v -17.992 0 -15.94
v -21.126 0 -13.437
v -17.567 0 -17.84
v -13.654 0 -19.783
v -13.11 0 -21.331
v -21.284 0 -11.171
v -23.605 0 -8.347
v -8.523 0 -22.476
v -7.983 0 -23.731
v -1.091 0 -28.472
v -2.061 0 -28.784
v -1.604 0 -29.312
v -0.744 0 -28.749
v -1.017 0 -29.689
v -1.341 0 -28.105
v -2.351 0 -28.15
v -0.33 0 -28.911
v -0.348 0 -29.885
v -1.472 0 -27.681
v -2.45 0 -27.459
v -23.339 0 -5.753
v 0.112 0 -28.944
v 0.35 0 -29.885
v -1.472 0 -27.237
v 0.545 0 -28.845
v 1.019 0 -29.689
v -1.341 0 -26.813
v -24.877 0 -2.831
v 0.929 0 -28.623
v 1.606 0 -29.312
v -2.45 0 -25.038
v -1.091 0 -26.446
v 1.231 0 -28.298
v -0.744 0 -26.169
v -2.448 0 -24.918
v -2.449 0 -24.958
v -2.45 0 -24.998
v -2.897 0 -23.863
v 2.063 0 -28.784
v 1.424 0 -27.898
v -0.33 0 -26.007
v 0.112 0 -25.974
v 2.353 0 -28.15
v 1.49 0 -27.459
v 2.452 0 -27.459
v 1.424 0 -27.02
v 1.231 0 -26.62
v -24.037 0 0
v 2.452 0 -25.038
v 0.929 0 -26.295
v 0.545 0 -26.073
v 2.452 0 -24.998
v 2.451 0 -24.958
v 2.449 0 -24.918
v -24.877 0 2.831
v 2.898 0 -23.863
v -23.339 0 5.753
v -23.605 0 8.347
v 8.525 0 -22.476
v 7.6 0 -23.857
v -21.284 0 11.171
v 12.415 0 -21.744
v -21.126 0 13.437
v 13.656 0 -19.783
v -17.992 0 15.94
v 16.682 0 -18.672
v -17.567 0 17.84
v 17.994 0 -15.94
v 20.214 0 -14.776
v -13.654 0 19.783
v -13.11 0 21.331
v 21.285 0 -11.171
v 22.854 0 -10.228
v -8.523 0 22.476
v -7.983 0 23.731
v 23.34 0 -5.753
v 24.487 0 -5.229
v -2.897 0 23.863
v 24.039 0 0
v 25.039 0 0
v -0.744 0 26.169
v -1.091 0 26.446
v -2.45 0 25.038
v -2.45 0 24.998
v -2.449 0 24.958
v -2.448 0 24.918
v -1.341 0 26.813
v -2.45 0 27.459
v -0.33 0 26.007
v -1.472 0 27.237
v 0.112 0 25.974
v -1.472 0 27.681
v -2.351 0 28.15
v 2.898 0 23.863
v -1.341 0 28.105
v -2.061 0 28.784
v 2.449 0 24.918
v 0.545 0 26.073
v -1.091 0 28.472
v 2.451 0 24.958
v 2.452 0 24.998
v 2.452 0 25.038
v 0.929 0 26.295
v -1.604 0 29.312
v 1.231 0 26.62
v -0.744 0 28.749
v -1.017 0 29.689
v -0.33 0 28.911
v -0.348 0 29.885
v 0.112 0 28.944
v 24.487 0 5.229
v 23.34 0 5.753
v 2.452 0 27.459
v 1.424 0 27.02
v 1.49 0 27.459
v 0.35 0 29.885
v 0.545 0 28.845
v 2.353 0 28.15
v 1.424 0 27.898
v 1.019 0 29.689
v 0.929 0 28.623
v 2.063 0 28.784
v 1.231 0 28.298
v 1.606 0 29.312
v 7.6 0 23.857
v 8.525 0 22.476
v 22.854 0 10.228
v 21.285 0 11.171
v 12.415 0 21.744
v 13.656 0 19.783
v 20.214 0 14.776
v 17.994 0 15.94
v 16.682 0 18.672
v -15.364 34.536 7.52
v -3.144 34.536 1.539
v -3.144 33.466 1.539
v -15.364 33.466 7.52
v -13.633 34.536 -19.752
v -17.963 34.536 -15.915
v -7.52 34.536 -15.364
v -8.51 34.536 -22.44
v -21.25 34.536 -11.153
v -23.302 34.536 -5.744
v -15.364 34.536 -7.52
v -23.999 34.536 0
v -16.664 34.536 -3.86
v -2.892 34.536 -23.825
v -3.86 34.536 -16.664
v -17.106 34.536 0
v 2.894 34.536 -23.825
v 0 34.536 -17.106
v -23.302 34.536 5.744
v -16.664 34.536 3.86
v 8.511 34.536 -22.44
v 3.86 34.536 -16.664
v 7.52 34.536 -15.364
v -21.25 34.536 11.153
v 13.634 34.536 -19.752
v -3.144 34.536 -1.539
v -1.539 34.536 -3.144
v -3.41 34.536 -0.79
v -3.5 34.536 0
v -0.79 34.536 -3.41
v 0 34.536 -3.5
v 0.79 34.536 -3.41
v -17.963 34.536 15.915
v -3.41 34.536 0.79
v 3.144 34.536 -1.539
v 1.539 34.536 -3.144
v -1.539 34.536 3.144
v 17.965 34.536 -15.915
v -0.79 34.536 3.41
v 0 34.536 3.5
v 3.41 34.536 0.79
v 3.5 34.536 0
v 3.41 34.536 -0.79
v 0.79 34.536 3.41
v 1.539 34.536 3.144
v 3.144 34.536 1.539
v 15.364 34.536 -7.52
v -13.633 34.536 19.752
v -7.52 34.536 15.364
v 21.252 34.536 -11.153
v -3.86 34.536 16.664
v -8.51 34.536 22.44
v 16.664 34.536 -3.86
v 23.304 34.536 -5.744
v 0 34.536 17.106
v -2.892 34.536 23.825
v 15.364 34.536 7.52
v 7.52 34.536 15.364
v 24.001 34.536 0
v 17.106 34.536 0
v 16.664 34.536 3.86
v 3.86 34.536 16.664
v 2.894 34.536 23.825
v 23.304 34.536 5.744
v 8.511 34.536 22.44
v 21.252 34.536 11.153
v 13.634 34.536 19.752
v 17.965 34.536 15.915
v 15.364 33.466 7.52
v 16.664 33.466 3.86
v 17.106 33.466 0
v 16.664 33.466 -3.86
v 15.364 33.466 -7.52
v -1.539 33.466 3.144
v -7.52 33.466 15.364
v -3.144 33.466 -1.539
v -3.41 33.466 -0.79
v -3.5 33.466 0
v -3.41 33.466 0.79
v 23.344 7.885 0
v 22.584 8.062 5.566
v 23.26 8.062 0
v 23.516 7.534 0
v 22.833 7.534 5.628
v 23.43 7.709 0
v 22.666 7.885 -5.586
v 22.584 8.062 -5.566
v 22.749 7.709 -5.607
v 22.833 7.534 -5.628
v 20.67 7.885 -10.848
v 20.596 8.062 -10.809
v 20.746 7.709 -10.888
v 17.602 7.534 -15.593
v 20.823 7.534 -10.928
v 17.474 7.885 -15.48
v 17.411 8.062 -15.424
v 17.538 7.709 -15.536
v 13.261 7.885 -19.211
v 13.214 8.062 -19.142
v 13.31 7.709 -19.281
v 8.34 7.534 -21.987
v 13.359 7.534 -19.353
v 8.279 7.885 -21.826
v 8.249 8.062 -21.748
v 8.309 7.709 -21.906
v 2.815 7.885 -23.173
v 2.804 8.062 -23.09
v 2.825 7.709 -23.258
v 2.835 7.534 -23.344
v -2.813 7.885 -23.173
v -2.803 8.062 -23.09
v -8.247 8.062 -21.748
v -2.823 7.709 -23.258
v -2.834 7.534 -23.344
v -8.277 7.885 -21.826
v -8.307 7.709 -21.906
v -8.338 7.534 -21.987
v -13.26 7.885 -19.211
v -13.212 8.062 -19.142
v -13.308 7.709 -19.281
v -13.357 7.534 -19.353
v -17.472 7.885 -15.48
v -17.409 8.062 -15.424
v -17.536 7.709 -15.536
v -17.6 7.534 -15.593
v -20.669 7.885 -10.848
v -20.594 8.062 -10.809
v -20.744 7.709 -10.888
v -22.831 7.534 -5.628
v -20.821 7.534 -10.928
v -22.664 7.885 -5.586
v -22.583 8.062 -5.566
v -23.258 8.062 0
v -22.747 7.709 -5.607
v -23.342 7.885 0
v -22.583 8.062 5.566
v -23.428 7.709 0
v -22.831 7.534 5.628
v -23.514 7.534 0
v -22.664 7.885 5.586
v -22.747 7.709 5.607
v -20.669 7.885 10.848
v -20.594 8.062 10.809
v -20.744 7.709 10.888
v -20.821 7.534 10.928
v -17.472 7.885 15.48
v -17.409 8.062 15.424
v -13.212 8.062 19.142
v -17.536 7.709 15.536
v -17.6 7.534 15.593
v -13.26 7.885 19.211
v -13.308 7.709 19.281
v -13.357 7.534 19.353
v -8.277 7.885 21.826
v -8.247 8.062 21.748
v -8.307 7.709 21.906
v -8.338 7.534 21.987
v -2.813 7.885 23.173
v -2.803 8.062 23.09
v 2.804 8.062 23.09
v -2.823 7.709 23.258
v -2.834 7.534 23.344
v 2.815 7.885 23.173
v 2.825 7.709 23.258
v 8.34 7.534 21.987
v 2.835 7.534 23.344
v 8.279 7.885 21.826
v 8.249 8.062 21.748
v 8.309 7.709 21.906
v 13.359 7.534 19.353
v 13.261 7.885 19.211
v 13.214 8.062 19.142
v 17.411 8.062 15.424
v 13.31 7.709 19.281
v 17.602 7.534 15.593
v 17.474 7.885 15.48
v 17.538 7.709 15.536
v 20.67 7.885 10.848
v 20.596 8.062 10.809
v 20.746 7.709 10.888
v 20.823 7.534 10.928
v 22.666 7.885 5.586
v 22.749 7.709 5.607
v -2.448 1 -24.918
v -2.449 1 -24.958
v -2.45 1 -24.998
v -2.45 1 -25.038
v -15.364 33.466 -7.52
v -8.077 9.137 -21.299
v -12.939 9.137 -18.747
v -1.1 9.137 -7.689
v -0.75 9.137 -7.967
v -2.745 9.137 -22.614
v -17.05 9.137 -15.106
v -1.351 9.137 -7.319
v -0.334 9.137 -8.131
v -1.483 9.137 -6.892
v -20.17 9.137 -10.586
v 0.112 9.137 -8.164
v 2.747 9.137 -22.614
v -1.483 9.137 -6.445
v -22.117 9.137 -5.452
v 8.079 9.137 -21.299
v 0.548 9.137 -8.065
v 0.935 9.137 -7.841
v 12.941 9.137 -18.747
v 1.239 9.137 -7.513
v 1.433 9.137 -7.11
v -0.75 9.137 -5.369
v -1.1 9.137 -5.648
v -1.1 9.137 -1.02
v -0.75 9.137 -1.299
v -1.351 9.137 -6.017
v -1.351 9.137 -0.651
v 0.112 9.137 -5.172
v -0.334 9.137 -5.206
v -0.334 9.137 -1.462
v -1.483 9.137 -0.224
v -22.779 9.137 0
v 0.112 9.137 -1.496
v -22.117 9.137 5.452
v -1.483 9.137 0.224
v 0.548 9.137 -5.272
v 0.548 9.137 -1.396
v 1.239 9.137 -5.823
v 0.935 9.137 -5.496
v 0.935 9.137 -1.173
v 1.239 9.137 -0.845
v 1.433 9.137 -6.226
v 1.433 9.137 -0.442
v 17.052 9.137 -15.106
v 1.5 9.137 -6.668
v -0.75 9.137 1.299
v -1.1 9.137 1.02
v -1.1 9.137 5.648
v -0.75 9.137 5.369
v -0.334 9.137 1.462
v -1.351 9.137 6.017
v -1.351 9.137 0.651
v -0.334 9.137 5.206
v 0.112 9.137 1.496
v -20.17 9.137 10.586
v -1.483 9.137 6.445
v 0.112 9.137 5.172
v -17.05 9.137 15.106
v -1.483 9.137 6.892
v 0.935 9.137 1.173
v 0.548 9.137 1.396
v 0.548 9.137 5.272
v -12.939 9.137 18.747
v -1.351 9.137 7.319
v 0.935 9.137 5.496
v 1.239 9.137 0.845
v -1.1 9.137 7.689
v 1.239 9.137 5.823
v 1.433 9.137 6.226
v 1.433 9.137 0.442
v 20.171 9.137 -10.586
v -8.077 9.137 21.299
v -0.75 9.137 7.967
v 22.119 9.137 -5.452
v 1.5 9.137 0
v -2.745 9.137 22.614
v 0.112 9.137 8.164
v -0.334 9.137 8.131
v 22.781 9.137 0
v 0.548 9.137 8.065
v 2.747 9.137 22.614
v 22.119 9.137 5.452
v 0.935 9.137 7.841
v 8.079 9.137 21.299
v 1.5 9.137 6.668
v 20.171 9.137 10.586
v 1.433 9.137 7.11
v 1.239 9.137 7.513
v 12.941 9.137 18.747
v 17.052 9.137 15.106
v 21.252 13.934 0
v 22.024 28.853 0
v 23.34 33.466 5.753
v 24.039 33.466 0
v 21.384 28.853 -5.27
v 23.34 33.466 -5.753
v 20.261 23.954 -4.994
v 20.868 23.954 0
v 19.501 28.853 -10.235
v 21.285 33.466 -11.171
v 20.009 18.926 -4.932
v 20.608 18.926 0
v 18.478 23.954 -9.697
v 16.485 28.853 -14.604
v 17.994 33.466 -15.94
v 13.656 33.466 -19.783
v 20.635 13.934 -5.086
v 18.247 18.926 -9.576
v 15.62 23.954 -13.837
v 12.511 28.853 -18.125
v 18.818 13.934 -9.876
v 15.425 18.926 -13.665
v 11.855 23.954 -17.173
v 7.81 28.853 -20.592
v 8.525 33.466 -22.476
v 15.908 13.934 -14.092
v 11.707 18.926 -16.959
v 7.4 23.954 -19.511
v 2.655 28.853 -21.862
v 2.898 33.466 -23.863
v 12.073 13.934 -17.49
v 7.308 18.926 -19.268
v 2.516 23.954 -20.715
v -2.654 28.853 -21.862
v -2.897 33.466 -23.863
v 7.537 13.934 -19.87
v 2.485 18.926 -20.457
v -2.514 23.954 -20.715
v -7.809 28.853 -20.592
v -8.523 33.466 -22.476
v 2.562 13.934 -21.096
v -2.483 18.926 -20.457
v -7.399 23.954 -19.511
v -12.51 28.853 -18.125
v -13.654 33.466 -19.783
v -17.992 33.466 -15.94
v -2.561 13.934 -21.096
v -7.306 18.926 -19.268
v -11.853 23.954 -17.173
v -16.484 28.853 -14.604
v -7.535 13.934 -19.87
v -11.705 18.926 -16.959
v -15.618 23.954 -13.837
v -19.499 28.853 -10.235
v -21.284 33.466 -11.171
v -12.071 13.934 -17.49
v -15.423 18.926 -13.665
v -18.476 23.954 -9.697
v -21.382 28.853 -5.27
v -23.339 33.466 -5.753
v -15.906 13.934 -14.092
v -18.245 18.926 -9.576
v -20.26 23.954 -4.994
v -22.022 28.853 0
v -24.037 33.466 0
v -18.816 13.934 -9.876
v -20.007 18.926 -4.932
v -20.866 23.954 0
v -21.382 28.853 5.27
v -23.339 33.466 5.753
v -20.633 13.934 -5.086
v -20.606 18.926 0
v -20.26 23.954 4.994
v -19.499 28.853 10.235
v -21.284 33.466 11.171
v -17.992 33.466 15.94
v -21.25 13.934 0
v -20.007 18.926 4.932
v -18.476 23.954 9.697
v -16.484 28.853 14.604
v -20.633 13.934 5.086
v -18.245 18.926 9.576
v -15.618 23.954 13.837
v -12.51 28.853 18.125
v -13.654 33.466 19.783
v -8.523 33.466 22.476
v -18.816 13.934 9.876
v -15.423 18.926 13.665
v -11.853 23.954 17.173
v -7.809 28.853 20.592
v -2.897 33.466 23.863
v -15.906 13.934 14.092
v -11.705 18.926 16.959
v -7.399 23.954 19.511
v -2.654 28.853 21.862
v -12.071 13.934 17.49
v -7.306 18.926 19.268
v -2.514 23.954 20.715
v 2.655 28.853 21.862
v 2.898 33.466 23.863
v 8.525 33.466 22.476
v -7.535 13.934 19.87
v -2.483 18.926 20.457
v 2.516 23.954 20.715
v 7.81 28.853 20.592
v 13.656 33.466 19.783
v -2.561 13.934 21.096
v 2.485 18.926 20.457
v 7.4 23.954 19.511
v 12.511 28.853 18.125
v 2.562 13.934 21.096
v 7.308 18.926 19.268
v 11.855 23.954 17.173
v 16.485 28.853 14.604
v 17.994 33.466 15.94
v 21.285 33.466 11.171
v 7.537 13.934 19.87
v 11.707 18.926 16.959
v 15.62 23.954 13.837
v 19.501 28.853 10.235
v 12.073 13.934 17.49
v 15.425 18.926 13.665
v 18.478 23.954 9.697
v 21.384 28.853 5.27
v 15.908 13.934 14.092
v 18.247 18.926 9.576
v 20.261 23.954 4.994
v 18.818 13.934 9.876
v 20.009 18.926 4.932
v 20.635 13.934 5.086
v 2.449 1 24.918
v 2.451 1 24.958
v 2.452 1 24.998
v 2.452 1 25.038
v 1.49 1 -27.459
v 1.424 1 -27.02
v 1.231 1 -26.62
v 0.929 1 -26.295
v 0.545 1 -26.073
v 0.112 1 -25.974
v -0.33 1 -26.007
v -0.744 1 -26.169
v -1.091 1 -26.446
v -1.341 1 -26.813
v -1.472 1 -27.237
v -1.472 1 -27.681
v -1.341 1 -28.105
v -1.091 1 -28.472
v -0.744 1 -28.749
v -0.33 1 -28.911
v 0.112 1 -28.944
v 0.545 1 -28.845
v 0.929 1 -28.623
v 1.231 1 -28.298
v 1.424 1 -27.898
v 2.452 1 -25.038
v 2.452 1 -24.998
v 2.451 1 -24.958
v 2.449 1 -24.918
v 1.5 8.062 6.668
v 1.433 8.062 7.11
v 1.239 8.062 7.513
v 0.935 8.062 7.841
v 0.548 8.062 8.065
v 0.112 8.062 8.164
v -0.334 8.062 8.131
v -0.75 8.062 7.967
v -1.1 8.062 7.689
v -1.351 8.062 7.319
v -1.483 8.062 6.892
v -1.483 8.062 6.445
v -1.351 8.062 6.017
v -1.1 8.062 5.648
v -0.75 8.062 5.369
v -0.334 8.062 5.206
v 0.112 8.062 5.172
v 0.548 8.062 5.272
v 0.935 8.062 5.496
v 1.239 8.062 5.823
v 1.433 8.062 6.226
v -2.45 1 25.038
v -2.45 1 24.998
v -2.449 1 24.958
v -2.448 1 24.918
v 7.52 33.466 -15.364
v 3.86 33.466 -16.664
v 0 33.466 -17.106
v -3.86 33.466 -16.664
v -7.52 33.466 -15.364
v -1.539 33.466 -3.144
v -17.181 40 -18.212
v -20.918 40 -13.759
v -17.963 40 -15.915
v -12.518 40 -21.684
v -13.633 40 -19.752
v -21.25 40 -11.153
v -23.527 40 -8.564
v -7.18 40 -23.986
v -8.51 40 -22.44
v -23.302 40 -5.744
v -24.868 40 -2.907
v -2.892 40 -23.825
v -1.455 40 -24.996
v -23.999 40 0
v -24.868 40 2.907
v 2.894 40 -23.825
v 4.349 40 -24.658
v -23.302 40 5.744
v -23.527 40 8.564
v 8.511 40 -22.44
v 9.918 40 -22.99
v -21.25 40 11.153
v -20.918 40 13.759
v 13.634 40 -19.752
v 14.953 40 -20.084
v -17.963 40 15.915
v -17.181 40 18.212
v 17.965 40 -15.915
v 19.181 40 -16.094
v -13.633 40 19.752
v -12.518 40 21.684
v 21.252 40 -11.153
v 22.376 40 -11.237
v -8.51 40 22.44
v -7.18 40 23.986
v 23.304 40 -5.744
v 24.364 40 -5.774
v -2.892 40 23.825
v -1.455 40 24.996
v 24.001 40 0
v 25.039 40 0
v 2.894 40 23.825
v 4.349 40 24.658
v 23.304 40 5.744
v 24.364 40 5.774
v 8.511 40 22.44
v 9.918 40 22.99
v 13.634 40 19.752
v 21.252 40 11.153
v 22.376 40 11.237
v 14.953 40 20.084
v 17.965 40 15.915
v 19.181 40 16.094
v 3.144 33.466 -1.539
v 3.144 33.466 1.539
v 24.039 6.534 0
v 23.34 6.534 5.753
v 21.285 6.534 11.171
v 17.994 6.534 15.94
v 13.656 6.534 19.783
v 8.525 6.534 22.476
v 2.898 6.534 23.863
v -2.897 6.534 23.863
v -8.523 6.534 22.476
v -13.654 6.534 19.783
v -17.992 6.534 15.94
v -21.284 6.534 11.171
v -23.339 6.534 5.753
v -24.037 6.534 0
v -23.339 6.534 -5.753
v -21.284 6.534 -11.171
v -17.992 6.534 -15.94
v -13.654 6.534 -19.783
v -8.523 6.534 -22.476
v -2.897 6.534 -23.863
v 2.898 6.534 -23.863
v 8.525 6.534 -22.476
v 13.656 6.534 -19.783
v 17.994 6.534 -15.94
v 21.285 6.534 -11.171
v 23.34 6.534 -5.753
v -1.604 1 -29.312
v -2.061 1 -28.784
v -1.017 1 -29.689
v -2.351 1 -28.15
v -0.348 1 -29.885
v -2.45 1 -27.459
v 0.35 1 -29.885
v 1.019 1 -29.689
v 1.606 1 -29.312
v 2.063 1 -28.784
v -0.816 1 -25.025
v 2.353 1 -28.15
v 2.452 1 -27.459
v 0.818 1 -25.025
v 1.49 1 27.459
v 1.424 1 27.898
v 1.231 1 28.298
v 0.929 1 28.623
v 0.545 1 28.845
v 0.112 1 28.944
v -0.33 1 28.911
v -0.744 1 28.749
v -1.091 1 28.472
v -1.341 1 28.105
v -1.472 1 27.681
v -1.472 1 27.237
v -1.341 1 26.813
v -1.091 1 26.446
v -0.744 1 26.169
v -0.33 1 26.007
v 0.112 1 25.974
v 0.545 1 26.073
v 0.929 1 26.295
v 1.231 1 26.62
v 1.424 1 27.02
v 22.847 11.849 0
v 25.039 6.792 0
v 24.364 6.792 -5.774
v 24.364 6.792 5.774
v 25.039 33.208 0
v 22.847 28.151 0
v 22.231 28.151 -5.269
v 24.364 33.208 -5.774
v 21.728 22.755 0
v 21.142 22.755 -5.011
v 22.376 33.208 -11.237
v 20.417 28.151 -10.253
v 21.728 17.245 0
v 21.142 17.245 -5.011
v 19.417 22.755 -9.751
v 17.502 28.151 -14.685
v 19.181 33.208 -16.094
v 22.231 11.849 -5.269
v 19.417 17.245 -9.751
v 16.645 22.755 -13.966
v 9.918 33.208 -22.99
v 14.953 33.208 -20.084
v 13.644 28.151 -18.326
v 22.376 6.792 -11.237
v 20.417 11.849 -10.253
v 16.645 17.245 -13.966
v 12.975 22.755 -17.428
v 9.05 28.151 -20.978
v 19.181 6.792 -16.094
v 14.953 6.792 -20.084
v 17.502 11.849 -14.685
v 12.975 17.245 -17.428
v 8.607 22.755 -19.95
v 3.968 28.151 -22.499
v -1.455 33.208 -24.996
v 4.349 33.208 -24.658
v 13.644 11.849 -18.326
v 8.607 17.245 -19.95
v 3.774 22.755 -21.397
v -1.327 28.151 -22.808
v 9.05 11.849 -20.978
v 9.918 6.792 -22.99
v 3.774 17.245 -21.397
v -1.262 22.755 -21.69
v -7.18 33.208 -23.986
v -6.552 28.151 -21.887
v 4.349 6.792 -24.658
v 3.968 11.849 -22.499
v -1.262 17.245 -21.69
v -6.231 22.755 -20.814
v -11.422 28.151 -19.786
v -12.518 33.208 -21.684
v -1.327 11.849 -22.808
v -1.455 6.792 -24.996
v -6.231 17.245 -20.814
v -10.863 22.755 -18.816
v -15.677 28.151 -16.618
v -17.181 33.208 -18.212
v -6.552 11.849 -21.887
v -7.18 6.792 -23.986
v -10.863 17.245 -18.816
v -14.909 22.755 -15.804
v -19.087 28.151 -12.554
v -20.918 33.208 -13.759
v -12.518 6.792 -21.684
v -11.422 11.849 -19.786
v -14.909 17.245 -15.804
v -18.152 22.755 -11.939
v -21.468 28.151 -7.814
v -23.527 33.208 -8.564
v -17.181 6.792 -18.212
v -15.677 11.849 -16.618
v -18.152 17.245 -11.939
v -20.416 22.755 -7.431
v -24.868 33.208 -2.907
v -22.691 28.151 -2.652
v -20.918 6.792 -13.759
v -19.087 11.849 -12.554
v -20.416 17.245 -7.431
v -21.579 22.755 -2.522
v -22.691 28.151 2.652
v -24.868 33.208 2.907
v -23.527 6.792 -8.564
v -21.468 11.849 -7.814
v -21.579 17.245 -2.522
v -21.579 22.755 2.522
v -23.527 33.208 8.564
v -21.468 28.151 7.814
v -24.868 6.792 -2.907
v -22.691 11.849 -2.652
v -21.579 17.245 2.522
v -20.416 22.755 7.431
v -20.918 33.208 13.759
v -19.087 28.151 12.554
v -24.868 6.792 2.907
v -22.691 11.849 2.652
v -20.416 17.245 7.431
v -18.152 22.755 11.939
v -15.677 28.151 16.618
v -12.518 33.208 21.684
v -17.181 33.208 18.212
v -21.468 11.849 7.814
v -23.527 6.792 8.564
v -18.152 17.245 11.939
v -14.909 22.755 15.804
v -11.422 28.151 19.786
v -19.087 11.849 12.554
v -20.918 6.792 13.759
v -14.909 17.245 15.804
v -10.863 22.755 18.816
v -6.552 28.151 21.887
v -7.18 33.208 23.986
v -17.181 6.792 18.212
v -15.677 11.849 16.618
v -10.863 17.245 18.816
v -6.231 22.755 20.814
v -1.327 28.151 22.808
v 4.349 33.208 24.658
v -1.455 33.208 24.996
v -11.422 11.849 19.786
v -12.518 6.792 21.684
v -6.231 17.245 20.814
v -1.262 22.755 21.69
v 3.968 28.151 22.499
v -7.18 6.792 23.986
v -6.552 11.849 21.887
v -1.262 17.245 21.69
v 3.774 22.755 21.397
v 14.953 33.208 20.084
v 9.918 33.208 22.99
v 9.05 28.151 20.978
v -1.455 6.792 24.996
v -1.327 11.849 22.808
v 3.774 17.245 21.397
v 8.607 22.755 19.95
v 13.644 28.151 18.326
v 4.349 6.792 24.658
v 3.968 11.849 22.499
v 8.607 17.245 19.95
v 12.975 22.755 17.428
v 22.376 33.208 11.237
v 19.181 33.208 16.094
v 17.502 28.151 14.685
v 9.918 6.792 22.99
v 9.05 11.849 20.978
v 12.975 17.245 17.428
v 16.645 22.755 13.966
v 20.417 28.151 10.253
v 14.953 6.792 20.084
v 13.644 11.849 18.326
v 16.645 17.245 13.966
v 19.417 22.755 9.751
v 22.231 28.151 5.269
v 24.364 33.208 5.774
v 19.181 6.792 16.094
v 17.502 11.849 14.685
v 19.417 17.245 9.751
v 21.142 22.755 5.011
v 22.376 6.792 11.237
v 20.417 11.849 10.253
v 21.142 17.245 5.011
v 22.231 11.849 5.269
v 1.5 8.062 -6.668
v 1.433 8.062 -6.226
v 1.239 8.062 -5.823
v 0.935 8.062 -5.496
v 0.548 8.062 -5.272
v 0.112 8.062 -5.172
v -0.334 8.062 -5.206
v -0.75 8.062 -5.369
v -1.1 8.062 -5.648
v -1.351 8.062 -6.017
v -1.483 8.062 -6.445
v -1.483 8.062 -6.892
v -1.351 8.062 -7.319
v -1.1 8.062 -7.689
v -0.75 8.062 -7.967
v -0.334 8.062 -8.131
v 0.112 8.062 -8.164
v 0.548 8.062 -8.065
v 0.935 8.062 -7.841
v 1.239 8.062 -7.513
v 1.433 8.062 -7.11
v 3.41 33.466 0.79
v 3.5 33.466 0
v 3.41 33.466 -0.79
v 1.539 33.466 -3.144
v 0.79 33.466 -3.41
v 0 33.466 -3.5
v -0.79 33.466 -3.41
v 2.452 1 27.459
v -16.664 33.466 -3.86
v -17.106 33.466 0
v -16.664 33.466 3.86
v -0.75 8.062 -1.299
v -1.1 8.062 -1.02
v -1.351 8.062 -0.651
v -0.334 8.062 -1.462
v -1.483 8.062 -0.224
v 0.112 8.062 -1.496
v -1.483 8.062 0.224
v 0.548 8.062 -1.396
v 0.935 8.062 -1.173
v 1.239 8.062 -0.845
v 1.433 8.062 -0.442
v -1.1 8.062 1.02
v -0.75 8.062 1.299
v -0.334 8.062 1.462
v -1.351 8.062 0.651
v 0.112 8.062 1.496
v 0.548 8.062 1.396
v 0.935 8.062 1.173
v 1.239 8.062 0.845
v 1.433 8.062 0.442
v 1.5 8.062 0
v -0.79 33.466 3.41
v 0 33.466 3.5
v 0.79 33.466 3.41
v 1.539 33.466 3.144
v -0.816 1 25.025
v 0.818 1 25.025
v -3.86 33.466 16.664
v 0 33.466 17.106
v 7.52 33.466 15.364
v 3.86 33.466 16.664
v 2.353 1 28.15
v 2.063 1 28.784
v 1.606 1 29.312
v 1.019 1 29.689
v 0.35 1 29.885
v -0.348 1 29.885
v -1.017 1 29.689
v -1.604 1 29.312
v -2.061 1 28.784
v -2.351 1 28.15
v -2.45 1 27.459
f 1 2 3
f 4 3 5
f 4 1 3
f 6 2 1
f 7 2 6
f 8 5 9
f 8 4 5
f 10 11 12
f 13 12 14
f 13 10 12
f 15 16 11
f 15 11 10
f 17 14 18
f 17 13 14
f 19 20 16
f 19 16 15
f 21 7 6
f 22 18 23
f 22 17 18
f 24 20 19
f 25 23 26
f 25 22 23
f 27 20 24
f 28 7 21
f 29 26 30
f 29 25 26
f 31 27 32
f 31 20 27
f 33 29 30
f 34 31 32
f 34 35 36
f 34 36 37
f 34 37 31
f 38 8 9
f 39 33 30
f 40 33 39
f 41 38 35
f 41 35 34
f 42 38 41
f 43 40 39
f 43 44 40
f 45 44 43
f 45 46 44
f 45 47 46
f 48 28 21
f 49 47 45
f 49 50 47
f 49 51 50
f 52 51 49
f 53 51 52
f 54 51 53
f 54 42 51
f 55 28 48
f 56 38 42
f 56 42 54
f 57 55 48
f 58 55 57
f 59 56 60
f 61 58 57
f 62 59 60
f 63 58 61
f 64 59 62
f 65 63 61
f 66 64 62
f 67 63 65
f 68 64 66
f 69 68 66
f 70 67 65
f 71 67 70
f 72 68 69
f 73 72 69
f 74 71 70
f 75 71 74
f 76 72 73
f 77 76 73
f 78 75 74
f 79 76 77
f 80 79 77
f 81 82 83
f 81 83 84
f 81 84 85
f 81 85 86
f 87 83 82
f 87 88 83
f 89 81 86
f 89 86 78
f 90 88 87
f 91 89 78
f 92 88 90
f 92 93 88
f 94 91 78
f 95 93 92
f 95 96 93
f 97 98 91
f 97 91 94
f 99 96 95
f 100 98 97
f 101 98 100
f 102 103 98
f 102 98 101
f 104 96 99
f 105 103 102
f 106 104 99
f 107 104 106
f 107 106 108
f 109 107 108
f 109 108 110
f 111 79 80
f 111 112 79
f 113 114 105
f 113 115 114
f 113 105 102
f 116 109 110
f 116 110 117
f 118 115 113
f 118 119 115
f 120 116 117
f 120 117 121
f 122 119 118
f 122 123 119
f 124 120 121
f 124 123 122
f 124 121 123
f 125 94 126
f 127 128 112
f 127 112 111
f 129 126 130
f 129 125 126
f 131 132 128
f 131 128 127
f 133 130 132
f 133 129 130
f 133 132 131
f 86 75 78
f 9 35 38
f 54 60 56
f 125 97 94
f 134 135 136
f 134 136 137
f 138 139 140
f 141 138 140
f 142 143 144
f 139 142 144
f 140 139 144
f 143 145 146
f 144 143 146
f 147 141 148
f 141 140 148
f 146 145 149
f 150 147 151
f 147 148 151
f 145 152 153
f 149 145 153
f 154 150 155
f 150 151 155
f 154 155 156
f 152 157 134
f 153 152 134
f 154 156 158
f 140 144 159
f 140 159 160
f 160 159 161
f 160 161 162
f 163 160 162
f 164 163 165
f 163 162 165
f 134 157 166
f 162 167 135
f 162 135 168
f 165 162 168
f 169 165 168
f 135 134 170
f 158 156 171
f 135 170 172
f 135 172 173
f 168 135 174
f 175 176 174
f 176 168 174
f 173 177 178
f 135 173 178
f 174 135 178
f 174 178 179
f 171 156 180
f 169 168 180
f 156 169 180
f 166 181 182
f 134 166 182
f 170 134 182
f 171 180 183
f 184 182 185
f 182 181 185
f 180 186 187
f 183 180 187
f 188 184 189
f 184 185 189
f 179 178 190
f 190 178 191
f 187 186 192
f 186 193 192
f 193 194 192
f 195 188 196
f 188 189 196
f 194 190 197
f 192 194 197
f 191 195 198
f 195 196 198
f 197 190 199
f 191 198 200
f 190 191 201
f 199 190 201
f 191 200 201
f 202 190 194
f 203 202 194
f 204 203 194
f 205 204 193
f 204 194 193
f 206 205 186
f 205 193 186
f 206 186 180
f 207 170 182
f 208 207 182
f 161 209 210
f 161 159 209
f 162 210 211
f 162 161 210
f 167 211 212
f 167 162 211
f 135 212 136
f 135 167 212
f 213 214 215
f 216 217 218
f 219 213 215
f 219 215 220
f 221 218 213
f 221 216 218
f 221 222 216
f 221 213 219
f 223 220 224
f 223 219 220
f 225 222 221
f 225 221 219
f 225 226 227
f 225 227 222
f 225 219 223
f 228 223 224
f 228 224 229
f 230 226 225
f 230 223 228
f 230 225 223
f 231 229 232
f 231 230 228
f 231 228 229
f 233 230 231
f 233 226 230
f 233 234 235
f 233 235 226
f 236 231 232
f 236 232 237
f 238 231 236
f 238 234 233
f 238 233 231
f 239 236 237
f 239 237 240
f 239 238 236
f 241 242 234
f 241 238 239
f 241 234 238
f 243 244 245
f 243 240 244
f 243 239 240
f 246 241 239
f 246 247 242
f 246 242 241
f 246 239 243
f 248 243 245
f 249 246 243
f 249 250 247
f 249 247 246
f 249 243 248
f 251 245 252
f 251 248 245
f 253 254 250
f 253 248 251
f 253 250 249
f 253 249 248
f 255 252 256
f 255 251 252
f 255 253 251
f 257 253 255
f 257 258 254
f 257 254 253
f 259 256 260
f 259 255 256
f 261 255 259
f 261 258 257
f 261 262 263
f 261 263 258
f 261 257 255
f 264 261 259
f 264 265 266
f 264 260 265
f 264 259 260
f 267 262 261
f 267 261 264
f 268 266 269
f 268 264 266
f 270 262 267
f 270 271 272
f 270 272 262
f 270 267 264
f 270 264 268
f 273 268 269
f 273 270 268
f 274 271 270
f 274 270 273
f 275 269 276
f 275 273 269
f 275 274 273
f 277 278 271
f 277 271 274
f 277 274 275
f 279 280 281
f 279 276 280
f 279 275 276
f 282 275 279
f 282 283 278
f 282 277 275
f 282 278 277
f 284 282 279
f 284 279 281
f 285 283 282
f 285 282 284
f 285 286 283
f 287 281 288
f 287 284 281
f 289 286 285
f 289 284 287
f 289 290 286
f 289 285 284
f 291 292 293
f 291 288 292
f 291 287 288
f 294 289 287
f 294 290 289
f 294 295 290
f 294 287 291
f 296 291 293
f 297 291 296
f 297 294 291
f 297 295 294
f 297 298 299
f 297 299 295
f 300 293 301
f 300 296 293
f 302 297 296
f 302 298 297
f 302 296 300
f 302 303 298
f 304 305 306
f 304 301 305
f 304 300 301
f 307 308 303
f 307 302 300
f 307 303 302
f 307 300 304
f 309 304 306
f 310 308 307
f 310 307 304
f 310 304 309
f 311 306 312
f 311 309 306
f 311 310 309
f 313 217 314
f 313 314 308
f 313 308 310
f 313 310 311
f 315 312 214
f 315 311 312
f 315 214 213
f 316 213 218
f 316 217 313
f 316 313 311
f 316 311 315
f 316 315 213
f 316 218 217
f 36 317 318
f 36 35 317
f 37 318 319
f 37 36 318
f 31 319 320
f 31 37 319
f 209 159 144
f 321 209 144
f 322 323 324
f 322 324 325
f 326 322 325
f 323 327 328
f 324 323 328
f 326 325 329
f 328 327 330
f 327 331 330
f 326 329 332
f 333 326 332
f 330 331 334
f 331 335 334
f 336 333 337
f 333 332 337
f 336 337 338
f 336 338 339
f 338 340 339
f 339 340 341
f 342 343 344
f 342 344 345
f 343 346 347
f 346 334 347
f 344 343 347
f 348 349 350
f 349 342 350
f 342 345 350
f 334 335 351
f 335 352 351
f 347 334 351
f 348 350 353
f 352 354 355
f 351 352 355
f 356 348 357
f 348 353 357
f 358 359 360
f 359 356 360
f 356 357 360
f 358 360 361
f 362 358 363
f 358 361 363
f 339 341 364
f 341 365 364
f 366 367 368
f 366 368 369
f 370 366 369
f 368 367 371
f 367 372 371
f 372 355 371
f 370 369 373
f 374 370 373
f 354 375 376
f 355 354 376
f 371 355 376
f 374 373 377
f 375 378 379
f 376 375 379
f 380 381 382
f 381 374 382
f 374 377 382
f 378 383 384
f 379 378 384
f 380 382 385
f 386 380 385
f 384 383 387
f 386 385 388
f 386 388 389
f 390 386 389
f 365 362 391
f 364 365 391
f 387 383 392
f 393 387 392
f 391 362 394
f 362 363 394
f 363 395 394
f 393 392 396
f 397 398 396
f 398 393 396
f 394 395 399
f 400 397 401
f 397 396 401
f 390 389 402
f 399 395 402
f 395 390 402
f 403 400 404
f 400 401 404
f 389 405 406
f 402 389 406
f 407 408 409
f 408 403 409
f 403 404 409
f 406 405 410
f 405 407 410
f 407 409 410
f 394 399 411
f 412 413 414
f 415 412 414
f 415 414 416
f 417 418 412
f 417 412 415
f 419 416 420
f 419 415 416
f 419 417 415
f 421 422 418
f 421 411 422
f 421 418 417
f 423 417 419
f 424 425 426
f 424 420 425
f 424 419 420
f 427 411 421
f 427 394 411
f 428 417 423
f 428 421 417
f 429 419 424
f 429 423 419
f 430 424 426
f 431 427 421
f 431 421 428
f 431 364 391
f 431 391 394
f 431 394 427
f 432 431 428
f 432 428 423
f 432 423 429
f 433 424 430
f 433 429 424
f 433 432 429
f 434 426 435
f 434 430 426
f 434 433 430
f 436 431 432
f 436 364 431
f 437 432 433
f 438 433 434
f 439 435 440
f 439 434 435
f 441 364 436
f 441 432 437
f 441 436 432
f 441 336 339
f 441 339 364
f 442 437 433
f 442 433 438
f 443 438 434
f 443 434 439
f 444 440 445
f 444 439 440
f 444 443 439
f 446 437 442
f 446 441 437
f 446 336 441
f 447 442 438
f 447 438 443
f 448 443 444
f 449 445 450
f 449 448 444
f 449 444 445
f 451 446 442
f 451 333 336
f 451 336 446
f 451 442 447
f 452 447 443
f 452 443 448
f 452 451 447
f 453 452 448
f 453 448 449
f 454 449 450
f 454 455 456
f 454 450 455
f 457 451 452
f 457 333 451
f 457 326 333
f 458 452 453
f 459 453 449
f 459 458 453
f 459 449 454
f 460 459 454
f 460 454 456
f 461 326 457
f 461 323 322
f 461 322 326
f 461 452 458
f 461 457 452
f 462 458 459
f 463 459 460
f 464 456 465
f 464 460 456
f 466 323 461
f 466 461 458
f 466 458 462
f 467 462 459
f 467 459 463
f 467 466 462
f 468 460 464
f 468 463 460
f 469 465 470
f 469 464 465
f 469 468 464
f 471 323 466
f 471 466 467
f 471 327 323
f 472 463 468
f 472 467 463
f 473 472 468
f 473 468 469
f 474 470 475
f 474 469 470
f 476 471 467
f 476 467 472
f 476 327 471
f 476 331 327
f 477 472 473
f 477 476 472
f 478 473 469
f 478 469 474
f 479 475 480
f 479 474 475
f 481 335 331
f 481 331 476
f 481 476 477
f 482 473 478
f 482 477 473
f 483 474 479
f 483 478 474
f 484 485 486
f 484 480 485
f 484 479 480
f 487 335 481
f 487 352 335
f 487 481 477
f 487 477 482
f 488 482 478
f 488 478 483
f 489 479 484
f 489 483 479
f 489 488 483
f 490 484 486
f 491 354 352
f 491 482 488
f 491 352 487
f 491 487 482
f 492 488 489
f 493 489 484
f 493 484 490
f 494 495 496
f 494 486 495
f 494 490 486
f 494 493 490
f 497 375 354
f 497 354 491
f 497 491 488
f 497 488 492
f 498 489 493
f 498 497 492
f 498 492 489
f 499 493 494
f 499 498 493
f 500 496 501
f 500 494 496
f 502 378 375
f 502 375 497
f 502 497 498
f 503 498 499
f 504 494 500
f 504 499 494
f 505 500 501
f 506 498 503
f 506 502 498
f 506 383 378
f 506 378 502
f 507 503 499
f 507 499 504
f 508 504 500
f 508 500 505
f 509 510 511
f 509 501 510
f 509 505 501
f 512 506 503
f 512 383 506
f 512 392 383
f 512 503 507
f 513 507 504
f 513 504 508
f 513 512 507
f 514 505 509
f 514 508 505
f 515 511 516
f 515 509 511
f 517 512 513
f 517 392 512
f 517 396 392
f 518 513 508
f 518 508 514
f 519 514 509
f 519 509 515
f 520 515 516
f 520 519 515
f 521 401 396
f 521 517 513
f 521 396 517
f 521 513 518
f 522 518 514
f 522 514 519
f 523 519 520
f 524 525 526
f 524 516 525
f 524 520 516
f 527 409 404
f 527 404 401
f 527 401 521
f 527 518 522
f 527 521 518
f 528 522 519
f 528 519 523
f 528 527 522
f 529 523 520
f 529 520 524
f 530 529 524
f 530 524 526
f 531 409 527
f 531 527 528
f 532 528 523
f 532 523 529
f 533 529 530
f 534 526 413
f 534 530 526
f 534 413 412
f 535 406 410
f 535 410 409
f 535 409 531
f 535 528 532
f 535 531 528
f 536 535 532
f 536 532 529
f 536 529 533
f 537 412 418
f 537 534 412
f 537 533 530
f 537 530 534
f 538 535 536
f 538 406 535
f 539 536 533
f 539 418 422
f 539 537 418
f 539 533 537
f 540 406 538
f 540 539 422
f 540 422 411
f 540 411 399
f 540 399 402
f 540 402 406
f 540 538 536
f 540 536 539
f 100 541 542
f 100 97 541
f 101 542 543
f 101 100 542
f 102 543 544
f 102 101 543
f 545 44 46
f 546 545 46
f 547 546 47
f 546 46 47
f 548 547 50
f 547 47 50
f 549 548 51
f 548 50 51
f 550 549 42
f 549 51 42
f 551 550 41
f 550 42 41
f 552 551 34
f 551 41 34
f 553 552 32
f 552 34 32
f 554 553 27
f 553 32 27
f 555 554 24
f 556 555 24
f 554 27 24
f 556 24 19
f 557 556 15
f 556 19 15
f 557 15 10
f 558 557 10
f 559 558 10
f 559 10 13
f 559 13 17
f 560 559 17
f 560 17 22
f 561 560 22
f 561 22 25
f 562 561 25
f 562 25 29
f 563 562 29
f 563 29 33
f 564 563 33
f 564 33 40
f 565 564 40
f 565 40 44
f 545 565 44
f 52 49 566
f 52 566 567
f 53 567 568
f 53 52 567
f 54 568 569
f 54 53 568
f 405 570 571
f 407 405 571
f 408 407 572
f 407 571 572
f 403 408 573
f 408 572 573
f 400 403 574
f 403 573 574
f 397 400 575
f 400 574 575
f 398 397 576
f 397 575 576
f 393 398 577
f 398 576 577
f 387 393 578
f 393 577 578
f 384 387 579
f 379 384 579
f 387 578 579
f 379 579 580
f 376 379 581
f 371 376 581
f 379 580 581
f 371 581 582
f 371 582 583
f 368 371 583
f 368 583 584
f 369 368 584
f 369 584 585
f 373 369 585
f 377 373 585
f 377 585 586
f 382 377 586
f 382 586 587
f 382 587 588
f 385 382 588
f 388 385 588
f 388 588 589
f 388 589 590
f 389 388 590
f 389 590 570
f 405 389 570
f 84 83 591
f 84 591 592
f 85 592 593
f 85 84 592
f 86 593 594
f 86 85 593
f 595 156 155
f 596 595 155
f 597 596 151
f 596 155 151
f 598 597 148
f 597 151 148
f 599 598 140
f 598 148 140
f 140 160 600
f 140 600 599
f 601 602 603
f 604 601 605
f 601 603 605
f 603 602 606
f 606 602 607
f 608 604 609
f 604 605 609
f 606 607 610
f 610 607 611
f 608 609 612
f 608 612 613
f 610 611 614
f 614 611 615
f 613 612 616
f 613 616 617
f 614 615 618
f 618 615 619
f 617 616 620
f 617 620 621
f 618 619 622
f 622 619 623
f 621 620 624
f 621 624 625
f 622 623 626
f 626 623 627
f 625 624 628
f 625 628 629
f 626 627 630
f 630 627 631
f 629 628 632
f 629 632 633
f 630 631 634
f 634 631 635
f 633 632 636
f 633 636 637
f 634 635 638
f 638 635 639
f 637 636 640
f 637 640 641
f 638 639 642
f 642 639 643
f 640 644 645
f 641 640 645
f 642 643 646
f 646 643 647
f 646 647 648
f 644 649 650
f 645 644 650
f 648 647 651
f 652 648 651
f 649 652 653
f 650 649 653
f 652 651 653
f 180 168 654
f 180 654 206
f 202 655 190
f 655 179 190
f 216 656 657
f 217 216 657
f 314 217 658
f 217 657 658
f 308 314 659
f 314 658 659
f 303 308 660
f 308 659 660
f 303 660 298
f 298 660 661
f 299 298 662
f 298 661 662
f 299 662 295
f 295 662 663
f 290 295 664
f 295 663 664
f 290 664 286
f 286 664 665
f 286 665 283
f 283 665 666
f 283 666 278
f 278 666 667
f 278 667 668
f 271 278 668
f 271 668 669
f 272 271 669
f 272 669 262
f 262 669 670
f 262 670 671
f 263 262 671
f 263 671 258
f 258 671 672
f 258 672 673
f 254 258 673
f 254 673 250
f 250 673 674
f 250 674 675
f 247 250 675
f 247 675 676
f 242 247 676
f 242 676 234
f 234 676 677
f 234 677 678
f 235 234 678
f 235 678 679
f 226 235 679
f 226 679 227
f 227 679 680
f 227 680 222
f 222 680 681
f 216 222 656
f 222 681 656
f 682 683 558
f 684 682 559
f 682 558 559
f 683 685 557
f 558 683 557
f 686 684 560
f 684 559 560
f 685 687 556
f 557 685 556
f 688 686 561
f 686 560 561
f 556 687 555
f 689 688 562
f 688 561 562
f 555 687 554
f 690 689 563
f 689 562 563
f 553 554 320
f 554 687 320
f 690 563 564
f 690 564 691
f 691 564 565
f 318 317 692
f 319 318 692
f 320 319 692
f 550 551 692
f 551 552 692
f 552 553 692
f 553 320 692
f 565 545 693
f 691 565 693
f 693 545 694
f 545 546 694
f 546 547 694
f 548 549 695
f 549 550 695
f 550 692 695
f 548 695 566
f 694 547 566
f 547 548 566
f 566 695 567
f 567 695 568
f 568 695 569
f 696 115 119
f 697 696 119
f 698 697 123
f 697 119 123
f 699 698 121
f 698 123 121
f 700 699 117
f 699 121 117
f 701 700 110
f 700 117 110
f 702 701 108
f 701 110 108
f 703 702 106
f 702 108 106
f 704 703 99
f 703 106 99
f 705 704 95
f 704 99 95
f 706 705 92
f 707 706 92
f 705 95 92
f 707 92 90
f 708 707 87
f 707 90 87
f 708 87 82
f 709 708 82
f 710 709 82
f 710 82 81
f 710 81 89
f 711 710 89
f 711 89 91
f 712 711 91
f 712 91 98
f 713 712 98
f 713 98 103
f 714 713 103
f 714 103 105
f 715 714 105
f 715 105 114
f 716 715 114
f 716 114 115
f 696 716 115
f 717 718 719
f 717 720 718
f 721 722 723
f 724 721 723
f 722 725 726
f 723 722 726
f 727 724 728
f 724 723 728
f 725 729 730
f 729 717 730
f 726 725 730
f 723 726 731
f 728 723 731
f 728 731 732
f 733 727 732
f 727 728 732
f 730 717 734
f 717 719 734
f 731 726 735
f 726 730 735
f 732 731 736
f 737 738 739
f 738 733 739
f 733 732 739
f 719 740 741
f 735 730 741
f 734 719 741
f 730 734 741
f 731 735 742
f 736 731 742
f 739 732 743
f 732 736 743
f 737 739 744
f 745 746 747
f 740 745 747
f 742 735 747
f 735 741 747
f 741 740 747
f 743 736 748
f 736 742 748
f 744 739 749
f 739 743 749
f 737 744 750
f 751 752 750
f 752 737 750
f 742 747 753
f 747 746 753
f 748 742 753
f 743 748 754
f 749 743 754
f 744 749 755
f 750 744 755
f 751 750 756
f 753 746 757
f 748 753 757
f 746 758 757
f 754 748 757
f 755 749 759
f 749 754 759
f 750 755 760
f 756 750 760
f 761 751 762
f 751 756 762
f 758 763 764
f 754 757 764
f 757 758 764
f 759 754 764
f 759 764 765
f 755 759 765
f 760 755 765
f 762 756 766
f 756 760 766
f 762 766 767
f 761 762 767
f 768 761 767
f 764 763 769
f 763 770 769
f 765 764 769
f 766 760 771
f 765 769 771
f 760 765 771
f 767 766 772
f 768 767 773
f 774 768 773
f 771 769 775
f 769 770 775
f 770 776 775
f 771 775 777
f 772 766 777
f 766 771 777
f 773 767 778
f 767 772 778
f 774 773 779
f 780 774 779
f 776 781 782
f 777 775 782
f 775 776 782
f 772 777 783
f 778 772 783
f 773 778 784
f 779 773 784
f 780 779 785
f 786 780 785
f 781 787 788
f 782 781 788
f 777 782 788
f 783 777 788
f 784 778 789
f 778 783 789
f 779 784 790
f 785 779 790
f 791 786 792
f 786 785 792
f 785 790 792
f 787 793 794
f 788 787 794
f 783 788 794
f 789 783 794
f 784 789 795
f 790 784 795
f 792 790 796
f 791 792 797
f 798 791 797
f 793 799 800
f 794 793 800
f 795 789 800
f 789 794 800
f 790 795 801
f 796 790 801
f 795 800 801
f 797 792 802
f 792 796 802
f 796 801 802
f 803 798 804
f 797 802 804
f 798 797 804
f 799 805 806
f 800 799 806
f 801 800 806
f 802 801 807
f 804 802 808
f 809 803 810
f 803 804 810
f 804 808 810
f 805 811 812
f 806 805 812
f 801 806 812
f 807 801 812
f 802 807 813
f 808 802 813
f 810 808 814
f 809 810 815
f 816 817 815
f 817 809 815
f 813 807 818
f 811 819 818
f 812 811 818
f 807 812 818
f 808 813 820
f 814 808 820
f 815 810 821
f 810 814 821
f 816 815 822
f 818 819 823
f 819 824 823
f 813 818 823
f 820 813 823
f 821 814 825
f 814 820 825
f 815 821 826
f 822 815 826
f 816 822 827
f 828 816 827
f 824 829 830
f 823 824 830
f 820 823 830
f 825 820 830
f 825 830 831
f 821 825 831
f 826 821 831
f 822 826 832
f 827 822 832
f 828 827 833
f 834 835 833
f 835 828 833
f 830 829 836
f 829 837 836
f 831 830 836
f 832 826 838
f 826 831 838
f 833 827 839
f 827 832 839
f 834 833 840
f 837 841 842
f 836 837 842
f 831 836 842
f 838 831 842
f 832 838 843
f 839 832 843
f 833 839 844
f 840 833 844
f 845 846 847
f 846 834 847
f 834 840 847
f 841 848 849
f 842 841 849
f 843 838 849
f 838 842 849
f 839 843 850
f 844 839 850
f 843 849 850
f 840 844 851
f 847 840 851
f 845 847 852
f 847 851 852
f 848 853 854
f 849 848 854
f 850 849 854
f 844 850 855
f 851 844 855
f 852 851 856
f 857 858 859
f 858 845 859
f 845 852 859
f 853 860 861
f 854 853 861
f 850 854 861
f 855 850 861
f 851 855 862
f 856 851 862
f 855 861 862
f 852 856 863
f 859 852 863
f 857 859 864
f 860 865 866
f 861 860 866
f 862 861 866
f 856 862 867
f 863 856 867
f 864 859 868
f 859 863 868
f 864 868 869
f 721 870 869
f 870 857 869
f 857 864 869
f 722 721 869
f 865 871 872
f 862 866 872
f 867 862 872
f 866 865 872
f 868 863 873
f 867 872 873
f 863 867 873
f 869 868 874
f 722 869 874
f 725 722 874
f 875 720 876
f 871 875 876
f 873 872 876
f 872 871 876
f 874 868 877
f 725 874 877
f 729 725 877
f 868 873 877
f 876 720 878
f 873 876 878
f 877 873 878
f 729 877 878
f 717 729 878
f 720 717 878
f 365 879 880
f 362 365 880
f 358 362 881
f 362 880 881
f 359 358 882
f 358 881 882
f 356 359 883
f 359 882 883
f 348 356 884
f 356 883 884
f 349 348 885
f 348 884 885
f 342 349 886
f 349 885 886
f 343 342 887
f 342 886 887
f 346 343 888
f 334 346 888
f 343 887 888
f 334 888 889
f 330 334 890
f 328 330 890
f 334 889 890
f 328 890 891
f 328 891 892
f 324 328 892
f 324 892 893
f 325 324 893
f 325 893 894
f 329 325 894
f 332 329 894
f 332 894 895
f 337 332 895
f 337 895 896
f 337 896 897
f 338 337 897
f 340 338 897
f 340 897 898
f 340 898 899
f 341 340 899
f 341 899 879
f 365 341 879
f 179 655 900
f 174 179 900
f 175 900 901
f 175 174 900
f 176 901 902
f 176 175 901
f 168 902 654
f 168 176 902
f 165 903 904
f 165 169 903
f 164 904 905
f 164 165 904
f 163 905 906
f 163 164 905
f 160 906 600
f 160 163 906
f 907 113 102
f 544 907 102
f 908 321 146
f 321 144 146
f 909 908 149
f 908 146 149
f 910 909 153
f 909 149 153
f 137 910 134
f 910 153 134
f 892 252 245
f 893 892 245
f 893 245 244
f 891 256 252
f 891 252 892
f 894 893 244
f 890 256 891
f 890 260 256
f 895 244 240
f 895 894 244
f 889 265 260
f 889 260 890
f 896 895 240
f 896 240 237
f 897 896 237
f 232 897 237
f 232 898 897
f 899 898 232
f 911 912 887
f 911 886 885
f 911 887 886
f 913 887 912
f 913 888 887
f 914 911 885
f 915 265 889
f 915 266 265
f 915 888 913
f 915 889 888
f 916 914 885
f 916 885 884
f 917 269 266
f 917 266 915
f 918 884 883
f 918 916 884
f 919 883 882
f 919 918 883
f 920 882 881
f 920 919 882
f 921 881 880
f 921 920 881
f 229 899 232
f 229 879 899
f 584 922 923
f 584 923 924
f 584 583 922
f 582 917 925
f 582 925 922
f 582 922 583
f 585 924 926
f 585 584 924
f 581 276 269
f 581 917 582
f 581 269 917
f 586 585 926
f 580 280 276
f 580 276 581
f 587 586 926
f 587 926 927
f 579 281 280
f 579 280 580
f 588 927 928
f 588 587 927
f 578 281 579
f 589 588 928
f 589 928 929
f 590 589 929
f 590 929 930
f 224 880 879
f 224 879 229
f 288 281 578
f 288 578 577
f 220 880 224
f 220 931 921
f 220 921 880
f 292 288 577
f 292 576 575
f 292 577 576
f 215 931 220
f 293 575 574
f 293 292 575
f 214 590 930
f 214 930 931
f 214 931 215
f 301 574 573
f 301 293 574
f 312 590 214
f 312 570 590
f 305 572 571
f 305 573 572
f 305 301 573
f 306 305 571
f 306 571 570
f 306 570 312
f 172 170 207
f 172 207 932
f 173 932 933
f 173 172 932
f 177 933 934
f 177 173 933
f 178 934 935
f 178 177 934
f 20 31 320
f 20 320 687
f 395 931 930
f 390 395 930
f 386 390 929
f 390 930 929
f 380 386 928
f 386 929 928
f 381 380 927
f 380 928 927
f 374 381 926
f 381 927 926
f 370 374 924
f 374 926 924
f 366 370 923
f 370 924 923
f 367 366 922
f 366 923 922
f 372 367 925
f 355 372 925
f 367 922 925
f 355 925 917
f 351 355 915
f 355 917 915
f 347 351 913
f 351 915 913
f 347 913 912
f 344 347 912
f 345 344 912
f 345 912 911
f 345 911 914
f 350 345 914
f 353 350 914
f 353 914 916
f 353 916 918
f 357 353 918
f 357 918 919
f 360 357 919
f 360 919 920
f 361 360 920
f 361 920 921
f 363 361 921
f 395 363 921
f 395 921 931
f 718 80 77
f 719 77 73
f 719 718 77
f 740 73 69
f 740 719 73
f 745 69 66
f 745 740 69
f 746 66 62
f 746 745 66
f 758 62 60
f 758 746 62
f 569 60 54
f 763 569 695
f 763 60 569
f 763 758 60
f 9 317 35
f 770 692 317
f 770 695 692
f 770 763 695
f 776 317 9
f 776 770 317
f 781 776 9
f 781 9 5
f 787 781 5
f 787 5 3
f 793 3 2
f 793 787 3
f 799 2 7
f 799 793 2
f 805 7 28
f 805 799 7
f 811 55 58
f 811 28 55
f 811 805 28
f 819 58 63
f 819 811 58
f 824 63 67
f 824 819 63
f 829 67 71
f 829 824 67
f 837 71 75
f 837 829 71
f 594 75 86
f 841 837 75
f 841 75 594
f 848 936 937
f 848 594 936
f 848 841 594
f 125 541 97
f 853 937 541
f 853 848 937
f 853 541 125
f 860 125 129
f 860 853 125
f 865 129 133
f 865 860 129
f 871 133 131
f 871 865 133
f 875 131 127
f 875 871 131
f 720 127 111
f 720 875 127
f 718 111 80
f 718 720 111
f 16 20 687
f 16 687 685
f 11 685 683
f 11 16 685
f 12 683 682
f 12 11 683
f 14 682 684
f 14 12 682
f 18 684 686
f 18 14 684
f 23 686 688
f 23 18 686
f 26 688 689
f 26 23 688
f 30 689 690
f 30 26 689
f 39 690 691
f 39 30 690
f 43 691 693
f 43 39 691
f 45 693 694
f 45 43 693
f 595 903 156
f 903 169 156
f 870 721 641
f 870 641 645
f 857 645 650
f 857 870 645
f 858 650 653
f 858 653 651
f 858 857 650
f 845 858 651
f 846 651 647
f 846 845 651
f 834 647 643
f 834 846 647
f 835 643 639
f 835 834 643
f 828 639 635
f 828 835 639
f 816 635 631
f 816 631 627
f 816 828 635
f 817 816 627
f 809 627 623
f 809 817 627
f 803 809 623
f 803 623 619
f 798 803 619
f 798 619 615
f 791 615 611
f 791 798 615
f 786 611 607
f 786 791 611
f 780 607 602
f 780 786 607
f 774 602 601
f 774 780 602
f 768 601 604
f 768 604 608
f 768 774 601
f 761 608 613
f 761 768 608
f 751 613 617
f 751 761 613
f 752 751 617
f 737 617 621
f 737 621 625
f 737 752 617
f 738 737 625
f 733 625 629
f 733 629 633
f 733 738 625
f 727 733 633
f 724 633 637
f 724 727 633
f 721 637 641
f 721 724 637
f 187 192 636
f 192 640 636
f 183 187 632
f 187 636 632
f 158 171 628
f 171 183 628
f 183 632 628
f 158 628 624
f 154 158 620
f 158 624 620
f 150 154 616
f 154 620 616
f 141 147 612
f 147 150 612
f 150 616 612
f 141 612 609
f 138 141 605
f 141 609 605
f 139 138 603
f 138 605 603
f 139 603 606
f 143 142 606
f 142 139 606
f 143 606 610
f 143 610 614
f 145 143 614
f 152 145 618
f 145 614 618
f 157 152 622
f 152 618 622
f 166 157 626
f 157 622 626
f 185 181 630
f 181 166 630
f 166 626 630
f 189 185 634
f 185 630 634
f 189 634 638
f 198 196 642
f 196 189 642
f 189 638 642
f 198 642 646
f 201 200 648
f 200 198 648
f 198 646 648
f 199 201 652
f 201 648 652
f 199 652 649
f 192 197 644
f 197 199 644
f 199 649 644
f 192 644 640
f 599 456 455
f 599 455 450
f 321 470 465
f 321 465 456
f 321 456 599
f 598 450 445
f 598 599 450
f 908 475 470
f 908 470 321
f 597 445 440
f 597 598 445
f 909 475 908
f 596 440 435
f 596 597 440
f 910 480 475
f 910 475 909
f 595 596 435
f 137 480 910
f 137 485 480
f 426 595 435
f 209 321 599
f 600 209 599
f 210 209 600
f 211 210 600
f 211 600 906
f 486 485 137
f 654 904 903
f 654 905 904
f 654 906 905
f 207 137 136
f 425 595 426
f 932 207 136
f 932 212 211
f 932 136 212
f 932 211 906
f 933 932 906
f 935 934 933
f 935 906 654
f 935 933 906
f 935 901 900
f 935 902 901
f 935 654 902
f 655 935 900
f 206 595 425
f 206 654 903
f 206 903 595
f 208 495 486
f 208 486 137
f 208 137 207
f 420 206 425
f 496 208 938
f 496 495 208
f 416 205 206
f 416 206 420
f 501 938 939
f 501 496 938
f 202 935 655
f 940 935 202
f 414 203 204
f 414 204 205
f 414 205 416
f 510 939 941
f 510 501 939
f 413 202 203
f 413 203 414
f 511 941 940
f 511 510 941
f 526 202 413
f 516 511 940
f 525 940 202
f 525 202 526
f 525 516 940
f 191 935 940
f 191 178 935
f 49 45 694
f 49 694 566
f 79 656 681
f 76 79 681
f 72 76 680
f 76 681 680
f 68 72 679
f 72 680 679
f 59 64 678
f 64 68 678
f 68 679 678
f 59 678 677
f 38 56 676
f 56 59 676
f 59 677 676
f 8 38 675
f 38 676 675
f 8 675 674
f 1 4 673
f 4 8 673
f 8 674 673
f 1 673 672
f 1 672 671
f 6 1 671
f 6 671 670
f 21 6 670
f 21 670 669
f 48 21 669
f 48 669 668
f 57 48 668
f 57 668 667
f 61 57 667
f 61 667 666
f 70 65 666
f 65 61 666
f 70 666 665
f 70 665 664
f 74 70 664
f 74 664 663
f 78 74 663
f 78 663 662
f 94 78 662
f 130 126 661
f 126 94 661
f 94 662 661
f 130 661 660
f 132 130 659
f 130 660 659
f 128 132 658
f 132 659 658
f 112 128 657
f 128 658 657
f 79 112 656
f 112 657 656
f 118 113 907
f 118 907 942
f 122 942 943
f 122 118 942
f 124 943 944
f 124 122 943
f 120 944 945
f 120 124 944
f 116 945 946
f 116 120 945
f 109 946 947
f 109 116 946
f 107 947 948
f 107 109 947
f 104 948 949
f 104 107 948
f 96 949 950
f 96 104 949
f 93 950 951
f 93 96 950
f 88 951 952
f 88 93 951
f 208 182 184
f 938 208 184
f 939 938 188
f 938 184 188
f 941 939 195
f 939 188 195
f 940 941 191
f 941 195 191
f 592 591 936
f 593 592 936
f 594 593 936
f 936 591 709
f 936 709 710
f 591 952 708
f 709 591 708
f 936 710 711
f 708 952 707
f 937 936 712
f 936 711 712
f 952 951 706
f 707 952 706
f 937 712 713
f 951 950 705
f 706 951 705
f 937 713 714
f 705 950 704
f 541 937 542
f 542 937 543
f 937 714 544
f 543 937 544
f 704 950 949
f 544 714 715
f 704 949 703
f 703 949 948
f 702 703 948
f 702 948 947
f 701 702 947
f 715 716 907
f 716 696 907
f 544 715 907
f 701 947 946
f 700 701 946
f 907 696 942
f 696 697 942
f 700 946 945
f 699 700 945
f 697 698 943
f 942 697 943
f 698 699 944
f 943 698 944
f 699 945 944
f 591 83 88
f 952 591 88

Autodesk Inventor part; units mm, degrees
ref_plane "YZ Plane" through (0, 0, 0) normal (1, 0, 0) x (0, 1, 0)
ref_plane "XZ Plane" through (0, 0, 0) normal (0, 1, 0) x (-1, 0, 0)
sketch "Esboço1" plane through (0, 0, 0) normal (0, 0, 1) x (1, 0, 0)
  line L0 (25.0389, 40) -> (25.0389, 33.2076)
  line L1 (25.0389, 0) -> (25.0389, 6.7924)
  arc A0 (25.0389, 33.2076) -> (25.0389, 6.7924) centre (48.5809, 20) ccw
  line L2 (24.0389, 0) -> (24.0389, 6.5336)
  line L3 (24.0009, 34.5359) -> (24.0009, 39.0029)
  line L4 (24.0009, 40) -> (25.0389, 40)
  line L5 (24.0389, 33.4664) -> (5.7012, 33.4664)
  line L6 (5.6632, 34.5359) -> (24.0009, 34.5359)
  line L7 (24.0009, 39.0029) -> (24.0009, 40)
  line L8 (5.6632, 34.5359) -> (4.6632, 34.5359)
  line L9 (5.7012, 33.4664) -> (4.7012, 33.4664)
  line L10 (25.0389, 0) -> (24.0389, 0)
  line L11 (24.0009, 34.5359) -> (0.0009, 34.5359)
  line L12 (4.7012, 33.4664) -> (0.0389, 33.4664)
  line L13 (0.0009, 34.5359) -> (0.0009, -0.006)
  line L14 (0.0009, 6.5336) -> (0.0009, 7.5336)
  line L15 (0.0009, 6.5336) -> (0.0009, 7.5336)
  line L16 (0.0009, 6.5336) -> (0.0009, 7.5336)
  line L17 (0.0009, 6.5336) -> (0.0009, 7.5336)
  line L18 (0.0009, 34.5359) -> (0.0009, 33.4664)
  line L19 (0.0389, 33.4664) -> (0.0009, 33.4664)
  line L20 (22.7806, 9.1373) -> (0.0009, 9.1373)
  line L21 (0.0009, 8.062) -> (23.2602, 8.062)
  line L22 (23.5161, 7.5336) -> (24.0389, 6.5336)
  arc A1 (24.0389, 33.4664) -> (22.7806, 9.1373) centre (48.5809, 20) ccw
  arc A2 (23.2602, 8.062) -> (23.5161, 7.5336) centre (48.5809, 20) ccw
  line L23 (0.0009, 9.1373) -> (0.0009, 8.062)
  line L24 (0.0009, 8.062) -> (0.0009, 7.062)
  point P0 (0, 0)
  point P1 (0, 0)
  point P2 (0.0199, 33.4664)
  dimension "d16" = 24.3291
  dimension "d17" = 1.0695
  dimension "d19" = 1
revolve "Revolução1" add sketch "Esboço1" angle 360 about axis through (0.0009, 34.5359, 0) along (0, -1, 0) contours L0 A0 L1 L10 L2 L22 A2 L21 L13 L20 A1 L5 L9 L12 L19 L11 L8 L6 L3 L7 L4
sketch "Esboço2" plane through (0.0009, 8.062, 0) normal (0, -1, 0) x (1, 0, 0)
  point P0 (-0.0009, 0)
sketch "Esboço3" plane through (0.0009, 34.5359, 0) normal (0, 1, 0) x (1, 0, 0)
  circle A0 centre (-0.0009, 0) radius 3.5
  circle A1 centre (-0.0009, 0) radius 17.1056
  line L0 (-0.0009, 0) -> (-7.5211, 15.3639)
  line L1 (-0.0009, 0) -> (-0.0009, 6.0664)
  line L2 (-0.0009, 0) -> (7.5193, 15.3639)
  line L3 (-0.0009, 0) -> (-15.3648, -7.5202)
  line L4 (-0.0009, 0) -> (-15.3648, 7.5202)
  line L5 (-0.0009, 0) -> (7.5193, -15.3639)
  line L6 (-0.0009, 0) -> (-7.5211, -15.3639)
  line L7 (-0.0009, 0) -> (15.3629, 7.5202)
  line L8 (-0.0009, 0) -> (15.3629, -7.5202)
  point P0 (-3.1445, 1.5387)
  point P1 (-3.1445, -1.5387)
  point P2 (3.1427, -1.5387)
  point P3 (3.1427, 1.5387)
  point P4 (-1.5396, -3.1436)
  point P5 (1.5378, -3.1436)
  point P6 (1.5378, 3.1436)
  point P7 (-1.5396, 3.1436)
  dimension "d1" = 7
  dimension "d4" = 360
extrude "Extrusão1" cut sketch "Esboço3" against normal blind 10 contours A0 L7 A1 L8 | A0 L0 A1 L2 | L5 A1 L6 A0 | L3 A1 L4 A0
sketch "Esboço4" plane through (0.0009, 8.062, 0) normal (0, -1, 0) x (1, 0, 0)
  circle A0 centre (-0.0009, 0) radius 1.5
  circle A1 centre (-0.0009, 6.6683) radius 1.5
  line L0 (-0.0009, 0) -> (-5.2667, 0)
  circle A2 centre (-0.0009, -6.6683) radius 1.5
  dimension "d8" = 3
  dimension "d9" = 3
extrude "Extrusão2" cut sketch "Esboço4" against normal blind 10
ref_plane "Plano de trabalho1" through (0.0009, 0, 0) normal (0, -1, 0) x (1, 0, 0)
sketch "Esboço5" plane through (0.0009, 0, 0) normal (0, -1, 0) x (1, 0, 0)
  circle A0 centre (0, 0) radius 25.038 projected
  line L0 (0, 25.038) -> (0, 27.459) construction
  line L1 (-2.4513, 25.038) -> (-2.4513, 27.459)
  line L2 (2.4513, 27.459) -> (2.4513, 25.038)
  arc A1 (2.4513, 27.459) -> (-2.4513, 27.459) centre (0, 27.459) ccw
  line L3 (-7.3697, 0) -> (-12.5067, 0)
  circle A2 centre (0, 27.459) radius 1.4892
  line L4 (-2.4513, -25.038) -> (-2.4513, -27.459)
  line L5 (2.4513, -27.459) -> (2.4513, -25.038)
  arc A3 (-2.4513, -27.459) -> (2.4513, -27.459) centre (0, -27.459) ccw
  circle A4 centre (0, -27.459) radius 1.4892
  arc A5 (-2.4513, 25.038) -> (-2.4484, 24.918) centre (0, 25.038) ccw
  arc A6 (2.4484, 24.918) -> (2.4513, 25.038) centre (0, 25.038) ccw
  arc A7 (2.4513, -25.038) -> (2.4484, -24.918) centre (0, -25.038) ccw
  arc A8 (-2.4484, -24.918) -> (-2.4513, -25.038) centre (0, -25.038) ccw
  point P0 (-0.0009, 0)
  point P1 (0, 26.2485)
  dimension "d15" = 2.9784
extrude "Extrusão3" add sketch "Esboço5" against normal blind 1 contours A0 A5 L1 A1 L2 A6 | A7 L5 A3 L4 A8 A0
properties part number "acoplamento_ventoinha1"
